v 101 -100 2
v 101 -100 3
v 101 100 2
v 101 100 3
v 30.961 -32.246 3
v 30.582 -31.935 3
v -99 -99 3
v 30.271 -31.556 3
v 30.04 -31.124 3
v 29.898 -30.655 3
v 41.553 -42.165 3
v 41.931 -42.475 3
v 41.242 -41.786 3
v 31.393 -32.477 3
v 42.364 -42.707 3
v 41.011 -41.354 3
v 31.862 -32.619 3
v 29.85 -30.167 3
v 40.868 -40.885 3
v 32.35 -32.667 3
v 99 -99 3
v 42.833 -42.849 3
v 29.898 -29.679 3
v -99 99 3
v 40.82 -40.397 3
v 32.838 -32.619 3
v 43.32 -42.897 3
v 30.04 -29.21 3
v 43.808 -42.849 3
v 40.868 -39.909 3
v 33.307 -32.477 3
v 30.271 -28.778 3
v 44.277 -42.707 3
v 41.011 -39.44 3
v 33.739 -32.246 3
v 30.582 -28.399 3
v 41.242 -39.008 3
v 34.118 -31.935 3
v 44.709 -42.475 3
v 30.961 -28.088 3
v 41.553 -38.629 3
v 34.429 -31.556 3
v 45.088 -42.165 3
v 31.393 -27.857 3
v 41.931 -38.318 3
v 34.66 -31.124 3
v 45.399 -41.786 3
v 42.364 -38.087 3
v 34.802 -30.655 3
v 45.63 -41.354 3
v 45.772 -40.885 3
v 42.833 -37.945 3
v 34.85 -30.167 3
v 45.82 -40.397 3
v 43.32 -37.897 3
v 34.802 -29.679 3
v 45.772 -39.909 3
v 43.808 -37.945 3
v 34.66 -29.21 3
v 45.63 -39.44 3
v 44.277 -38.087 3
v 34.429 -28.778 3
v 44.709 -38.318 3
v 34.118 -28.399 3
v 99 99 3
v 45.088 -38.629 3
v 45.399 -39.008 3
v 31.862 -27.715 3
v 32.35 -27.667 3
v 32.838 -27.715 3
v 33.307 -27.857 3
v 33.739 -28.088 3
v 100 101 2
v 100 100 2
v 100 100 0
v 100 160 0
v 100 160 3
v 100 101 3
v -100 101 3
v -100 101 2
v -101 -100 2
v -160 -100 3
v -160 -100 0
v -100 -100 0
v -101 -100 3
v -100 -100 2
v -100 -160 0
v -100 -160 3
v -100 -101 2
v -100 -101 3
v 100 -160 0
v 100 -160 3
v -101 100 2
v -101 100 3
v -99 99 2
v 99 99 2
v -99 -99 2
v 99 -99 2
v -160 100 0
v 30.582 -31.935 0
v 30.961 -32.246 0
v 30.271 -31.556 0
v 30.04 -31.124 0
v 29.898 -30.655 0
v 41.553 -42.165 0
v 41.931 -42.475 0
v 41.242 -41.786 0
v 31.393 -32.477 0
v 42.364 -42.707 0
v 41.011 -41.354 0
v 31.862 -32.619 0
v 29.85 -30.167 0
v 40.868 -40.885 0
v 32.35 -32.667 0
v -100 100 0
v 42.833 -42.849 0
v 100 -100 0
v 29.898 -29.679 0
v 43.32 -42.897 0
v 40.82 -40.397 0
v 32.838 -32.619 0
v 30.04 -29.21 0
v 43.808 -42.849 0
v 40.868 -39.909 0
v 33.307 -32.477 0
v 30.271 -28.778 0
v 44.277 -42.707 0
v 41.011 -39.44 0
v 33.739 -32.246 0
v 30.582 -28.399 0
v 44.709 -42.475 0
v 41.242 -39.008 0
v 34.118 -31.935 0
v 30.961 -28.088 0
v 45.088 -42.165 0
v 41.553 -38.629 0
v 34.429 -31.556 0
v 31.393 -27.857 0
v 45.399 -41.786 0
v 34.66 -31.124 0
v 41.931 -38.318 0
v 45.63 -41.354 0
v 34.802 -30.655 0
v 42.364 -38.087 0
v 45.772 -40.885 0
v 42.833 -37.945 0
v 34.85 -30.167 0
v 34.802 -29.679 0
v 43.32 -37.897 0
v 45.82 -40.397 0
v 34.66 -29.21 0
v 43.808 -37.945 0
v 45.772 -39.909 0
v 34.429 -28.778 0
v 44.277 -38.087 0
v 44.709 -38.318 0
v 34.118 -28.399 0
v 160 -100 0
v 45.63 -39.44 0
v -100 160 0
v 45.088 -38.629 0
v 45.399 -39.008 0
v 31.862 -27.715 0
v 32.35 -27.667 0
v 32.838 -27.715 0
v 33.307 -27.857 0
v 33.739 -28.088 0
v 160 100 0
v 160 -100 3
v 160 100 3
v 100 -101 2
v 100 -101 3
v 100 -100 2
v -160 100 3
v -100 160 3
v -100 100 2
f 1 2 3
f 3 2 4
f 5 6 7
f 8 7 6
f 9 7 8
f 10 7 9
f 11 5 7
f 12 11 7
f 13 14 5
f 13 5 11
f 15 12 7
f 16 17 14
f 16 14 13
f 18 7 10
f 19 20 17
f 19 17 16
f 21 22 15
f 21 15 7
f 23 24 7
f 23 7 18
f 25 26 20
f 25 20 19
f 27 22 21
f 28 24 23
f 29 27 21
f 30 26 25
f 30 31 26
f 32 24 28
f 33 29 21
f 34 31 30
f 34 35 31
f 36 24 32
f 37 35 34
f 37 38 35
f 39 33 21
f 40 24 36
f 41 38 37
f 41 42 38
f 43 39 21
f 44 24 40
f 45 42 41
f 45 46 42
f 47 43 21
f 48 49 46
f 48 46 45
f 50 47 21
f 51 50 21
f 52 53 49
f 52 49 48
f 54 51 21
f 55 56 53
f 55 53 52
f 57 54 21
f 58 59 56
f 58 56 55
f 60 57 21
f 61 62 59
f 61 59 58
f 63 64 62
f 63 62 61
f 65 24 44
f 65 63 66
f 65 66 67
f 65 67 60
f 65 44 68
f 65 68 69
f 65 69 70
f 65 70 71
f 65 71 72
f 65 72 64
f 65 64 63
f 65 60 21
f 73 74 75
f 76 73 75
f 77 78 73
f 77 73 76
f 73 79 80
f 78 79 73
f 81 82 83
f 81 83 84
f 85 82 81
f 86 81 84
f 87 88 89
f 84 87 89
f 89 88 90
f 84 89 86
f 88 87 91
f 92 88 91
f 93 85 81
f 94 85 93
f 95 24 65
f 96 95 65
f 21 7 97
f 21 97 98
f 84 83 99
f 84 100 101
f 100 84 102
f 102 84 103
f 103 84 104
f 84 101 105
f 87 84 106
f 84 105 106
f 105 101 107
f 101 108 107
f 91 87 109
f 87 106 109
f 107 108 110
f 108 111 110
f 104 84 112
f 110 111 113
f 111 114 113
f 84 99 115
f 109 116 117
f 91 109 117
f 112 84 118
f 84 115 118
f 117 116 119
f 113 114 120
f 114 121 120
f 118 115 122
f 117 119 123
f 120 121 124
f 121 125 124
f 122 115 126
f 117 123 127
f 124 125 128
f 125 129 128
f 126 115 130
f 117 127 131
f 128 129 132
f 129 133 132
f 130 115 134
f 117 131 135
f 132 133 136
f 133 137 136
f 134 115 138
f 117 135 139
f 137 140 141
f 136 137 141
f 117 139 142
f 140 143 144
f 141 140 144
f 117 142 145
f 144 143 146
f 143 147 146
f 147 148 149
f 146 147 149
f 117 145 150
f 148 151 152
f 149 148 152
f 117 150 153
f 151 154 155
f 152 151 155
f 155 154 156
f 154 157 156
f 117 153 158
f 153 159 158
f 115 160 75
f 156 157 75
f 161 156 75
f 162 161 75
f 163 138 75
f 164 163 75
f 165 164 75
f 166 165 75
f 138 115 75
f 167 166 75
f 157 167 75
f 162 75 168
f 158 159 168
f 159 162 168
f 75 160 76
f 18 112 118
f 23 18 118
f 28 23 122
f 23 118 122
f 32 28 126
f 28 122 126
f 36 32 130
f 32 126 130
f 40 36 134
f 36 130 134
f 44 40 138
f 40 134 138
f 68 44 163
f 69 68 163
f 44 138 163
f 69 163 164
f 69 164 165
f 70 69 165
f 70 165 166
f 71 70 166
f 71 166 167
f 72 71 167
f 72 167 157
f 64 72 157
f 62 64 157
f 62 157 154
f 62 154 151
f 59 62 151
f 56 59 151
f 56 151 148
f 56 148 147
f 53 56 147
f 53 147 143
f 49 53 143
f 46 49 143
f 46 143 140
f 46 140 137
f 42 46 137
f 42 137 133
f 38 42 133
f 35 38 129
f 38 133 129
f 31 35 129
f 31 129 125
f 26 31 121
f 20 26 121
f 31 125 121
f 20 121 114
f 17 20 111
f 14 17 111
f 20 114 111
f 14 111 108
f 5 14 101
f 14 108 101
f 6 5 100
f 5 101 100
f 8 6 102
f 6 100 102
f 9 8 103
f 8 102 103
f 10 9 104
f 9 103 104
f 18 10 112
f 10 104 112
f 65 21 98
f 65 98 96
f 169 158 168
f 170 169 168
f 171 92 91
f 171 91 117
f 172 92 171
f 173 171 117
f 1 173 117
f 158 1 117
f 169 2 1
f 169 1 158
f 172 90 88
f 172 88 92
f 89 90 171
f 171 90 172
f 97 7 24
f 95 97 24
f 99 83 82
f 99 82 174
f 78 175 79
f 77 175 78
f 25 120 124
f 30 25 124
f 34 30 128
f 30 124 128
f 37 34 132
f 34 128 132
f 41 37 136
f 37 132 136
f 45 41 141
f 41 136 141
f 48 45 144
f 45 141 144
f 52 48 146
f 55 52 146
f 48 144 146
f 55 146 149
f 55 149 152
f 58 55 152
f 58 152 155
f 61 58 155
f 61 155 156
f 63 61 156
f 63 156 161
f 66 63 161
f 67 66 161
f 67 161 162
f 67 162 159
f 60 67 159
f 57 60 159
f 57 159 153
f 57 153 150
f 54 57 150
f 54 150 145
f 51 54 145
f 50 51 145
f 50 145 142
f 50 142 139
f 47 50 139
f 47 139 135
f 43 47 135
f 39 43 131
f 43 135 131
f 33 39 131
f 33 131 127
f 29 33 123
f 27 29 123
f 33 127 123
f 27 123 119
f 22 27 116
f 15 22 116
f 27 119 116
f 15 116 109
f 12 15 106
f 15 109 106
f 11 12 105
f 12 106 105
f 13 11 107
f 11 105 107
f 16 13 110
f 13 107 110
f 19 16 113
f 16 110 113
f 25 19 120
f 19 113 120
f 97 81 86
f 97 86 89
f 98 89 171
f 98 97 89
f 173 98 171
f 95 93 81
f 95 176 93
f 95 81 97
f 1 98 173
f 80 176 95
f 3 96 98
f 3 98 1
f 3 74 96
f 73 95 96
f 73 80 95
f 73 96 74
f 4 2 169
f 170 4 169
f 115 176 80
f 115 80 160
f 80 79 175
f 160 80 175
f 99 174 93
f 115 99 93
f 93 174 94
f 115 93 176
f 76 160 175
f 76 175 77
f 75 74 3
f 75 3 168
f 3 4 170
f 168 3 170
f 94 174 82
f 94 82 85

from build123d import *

# Parameters (mm, degrees)
ESQUISSE1_W                       = 320
ESQUISSE1_H                       = 320
BOSS_EXTRU_1_DEPTH                = 3
ENL_V_MAT_EXTRU_1_REACH           = 5
ESQUISSE2_W                       = 60
ESQUISSE2_H                       = 60
ESQUISSE3_W                       = 202
ESQUISSE3_H                       = 202
ESQUISSE3_W_2                     = 198
ESQUISSE3_H_2                     = 198
ENL_V_MAT_EXTRU_2_DEPTH           = 1
DIAM_TRE_DU_PER_AGE_5_0_5_1_D     = 5
DIAM_TRE_DU_PER_AGE_5_0_5_1_DEPTH = 3


with BuildPart() as part:
    # Esquisse1 → Boss.-Extru.1 (new body)
    with BuildSketch(Plane.XY):
        Rectangle(ESQUISSE1_W, ESQUISSE1_H)
    extrude(amount=BOSS_EXTRU_1_DEPTH)

    # Esquisse2 → Enlèv. mat.-Extru.1 (cut, up to next)
    with BuildSketch(Plane.XY.offset(3), mode=Mode.PRIVATE) as enl_v_mat_extru_1_sk1:
        with Locations((130, -130)):
            Rectangle(ESQUISSE2_W, ESQUISSE2_H)
    enl_v_mat_extru_1_tool1 = extrude(enl_v_mat_extru_1_sk1.sketch, amount=-ENL_V_MAT_EXTRU_1_REACH, mode=Mode.PRIVATE) & part.part
    add(enl_v_mat_extru_1_tool1.solids().sort_by_distance((130, -130, 3))[0], mode=Mode.SUBTRACT)
    # Esquisse2 → Enlèv. mat.-Extru.1 (cut, up to next)
    with BuildSketch(Plane.XY.offset(3), mode=Mode.PRIVATE) as enl_v_mat_extru_1_sk2:
        with Locations((-130, -130)):
            Rectangle(ESQUISSE2_W, ESQUISSE2_H)
    enl_v_mat_extru_1_tool2 = extrude(enl_v_mat_extru_1_sk2.sketch, amount=-ENL_V_MAT_EXTRU_1_REACH, mode=Mode.PRIVATE) & part.part
    add(enl_v_mat_extru_1_tool2.solids().sort_by_distance((-130, -130, 3))[0], mode=Mode.SUBTRACT)
    # Esquisse2 → Enlèv. mat.-Extru.1 (cut, up to next)
    with BuildSketch(Plane.XY.offset(3), mode=Mode.PRIVATE) as enl_v_mat_extru_1_sk3:
        with Locations((130, 130)):
            Rectangle(ESQUISSE2_W, ESQUISSE2_H)
    enl_v_mat_extru_1_tool3 = extrude(enl_v_mat_extru_1_sk3.sketch, amount=-ENL_V_MAT_EXTRU_1_REACH, mode=Mode.PRIVATE) & part.part
    add(enl_v_mat_extru_1_tool3.solids().sort_by_distance((130, 130, 3))[0], mode=Mode.SUBTRACT)
    # Esquisse2 → Enlèv. mat.-Extru.1 (cut, up to next)
    with BuildSketch(Plane.XY.offset(3), mode=Mode.PRIVATE) as enl_v_mat_extru_1_sk4:
        with Locations((-130, 130)):
            Rectangle(ESQUISSE2_W, ESQUISSE2_H)
    enl_v_mat_extru_1_tool4 = extrude(enl_v_mat_extru_1_sk4.sketch, amount=-ENL_V_MAT_EXTRU_1_REACH, mode=Mode.PRIVATE) & part.part
    add(enl_v_mat_extru_1_tool4.solids().sort_by_distance((-130, 130, 3))[0], mode=Mode.SUBTRACT)

    # Esquisse3 → Enlèv. mat.-Extru.2 (cut)
    with BuildSketch(Plane.XY.offset(3)):
        Rectangle(ESQUISSE3_W, ESQUISSE3_H)
        Rectangle(ESQUISSE3_W_2, ESQUISSE3_H_2, mode=Mode.SUBTRACT)
    extrude(amount=-ENL_V_MAT_EXTRU_2_DEPTH, mode=Mode.SUBTRACT)

    # Diamètre du perçage Ø5.0 (5)1
    with Locations(Plane.XY.offset(3)):
        with Locations((32.349968284, -30.166833461), (43.320273808, -40.396808862)):
            Hole(DIAM_TRE_DU_PER_AGE_5_0_5_1_D / 2, depth=DIAM_TRE_DU_PER_AGE_5_0_5_1_DEPTH)


solid = part.part
